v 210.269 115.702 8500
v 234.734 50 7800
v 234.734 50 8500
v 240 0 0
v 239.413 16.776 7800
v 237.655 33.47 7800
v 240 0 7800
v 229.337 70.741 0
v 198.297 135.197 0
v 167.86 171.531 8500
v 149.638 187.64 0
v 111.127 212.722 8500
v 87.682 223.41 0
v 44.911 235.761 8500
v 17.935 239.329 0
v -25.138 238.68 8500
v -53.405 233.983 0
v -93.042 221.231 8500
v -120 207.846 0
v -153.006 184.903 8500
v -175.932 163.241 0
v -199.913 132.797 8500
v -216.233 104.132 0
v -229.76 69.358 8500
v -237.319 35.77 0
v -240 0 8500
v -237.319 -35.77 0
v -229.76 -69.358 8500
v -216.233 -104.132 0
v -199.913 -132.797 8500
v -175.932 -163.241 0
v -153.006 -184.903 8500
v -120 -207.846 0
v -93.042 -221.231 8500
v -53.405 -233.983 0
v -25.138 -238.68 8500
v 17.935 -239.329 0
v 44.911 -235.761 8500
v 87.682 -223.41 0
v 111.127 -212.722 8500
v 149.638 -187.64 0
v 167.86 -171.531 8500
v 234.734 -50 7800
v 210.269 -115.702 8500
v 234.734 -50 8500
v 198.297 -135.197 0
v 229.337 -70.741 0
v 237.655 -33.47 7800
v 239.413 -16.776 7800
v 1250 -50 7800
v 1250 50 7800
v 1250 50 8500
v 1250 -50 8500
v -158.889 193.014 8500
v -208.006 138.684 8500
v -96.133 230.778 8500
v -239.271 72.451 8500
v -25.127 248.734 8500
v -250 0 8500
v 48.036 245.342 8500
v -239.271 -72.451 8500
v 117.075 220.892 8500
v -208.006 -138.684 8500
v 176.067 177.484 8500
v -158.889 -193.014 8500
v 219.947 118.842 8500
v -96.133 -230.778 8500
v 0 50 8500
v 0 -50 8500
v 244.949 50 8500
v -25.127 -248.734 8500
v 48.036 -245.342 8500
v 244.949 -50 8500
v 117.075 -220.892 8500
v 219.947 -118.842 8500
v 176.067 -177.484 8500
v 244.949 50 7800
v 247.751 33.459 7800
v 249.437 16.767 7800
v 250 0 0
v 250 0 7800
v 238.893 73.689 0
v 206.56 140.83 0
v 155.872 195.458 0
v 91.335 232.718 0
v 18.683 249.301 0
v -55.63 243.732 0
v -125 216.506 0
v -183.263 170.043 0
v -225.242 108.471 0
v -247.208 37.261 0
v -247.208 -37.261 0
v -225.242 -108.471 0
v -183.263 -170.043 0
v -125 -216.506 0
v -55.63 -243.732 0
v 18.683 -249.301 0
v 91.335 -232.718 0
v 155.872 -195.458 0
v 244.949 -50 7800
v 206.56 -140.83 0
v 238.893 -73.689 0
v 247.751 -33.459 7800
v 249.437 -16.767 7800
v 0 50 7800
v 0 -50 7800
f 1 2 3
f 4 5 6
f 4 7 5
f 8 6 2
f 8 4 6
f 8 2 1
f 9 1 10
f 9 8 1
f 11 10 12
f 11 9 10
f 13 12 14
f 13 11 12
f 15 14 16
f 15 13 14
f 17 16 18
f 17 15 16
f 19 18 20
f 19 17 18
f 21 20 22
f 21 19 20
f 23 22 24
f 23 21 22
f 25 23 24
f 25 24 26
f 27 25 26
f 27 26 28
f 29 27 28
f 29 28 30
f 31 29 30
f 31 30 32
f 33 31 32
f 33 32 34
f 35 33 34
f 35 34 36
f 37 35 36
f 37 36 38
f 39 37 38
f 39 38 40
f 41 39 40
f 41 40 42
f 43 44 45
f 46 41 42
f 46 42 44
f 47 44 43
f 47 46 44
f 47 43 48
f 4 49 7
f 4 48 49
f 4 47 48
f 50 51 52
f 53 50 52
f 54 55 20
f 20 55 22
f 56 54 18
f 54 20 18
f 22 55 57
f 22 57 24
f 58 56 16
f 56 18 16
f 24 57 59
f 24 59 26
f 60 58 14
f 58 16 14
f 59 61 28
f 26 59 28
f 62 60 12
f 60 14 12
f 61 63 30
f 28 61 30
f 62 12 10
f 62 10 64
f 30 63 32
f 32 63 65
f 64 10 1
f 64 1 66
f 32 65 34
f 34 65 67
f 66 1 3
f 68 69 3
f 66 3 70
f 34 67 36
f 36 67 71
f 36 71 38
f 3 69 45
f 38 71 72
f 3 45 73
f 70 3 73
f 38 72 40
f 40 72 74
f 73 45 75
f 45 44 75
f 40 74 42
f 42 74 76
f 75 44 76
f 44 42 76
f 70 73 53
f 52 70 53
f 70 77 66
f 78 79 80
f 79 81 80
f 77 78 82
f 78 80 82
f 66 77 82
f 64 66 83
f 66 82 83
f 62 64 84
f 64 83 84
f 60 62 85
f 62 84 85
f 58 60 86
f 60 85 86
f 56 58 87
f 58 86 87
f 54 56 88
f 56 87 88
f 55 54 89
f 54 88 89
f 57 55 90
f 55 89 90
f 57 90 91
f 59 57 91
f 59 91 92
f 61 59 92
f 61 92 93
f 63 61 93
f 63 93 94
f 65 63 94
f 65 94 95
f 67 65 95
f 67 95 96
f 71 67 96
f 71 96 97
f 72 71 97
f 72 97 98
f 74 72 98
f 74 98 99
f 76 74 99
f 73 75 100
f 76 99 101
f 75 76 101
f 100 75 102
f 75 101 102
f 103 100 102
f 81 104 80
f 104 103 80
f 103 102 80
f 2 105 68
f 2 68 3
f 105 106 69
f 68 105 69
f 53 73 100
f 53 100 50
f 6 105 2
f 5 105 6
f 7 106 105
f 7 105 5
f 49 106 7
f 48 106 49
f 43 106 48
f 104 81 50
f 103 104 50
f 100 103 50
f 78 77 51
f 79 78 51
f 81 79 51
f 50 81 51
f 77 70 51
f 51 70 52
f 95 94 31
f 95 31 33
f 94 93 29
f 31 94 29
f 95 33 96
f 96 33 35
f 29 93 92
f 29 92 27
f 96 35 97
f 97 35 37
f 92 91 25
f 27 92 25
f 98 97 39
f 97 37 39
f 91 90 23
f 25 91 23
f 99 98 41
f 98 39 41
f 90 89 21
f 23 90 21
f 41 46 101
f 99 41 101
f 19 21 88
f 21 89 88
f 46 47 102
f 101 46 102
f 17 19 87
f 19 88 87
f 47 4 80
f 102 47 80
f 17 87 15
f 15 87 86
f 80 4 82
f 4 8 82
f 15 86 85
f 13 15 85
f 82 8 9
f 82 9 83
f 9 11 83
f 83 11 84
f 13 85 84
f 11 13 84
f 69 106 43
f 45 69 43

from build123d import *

# Parameters (mm, degrees)
F0_R          = 250
F0_R_2        = 240
F1_DEPTH      = 8500
F2_W          = 1250
F2_H          = 700
F3_DEPTH      = 50
F3_DEPTH_BACK = 50


with BuildPart() as f1:
    # F0 (on Top) → F1 (new body)
    with BuildSketch(Plane.XY):
        Circle(F0_R)
        Circle(F0_R_2, mode=Mode.SUBTRACT)
    extrude(amount=F1_DEPTH)

    # F2 (on Front) → F3 (join, two sides)
    with BuildSketch(Plane.XZ) as f3_sk:
        with Locations((625, 8150)):
            Rectangle(F2_W, F2_H)
    extrude(amount=F3_DEPTH)
    extrude(f3_sk.sketch, amount=-F3_DEPTH_BACK)


solid = f1.part
